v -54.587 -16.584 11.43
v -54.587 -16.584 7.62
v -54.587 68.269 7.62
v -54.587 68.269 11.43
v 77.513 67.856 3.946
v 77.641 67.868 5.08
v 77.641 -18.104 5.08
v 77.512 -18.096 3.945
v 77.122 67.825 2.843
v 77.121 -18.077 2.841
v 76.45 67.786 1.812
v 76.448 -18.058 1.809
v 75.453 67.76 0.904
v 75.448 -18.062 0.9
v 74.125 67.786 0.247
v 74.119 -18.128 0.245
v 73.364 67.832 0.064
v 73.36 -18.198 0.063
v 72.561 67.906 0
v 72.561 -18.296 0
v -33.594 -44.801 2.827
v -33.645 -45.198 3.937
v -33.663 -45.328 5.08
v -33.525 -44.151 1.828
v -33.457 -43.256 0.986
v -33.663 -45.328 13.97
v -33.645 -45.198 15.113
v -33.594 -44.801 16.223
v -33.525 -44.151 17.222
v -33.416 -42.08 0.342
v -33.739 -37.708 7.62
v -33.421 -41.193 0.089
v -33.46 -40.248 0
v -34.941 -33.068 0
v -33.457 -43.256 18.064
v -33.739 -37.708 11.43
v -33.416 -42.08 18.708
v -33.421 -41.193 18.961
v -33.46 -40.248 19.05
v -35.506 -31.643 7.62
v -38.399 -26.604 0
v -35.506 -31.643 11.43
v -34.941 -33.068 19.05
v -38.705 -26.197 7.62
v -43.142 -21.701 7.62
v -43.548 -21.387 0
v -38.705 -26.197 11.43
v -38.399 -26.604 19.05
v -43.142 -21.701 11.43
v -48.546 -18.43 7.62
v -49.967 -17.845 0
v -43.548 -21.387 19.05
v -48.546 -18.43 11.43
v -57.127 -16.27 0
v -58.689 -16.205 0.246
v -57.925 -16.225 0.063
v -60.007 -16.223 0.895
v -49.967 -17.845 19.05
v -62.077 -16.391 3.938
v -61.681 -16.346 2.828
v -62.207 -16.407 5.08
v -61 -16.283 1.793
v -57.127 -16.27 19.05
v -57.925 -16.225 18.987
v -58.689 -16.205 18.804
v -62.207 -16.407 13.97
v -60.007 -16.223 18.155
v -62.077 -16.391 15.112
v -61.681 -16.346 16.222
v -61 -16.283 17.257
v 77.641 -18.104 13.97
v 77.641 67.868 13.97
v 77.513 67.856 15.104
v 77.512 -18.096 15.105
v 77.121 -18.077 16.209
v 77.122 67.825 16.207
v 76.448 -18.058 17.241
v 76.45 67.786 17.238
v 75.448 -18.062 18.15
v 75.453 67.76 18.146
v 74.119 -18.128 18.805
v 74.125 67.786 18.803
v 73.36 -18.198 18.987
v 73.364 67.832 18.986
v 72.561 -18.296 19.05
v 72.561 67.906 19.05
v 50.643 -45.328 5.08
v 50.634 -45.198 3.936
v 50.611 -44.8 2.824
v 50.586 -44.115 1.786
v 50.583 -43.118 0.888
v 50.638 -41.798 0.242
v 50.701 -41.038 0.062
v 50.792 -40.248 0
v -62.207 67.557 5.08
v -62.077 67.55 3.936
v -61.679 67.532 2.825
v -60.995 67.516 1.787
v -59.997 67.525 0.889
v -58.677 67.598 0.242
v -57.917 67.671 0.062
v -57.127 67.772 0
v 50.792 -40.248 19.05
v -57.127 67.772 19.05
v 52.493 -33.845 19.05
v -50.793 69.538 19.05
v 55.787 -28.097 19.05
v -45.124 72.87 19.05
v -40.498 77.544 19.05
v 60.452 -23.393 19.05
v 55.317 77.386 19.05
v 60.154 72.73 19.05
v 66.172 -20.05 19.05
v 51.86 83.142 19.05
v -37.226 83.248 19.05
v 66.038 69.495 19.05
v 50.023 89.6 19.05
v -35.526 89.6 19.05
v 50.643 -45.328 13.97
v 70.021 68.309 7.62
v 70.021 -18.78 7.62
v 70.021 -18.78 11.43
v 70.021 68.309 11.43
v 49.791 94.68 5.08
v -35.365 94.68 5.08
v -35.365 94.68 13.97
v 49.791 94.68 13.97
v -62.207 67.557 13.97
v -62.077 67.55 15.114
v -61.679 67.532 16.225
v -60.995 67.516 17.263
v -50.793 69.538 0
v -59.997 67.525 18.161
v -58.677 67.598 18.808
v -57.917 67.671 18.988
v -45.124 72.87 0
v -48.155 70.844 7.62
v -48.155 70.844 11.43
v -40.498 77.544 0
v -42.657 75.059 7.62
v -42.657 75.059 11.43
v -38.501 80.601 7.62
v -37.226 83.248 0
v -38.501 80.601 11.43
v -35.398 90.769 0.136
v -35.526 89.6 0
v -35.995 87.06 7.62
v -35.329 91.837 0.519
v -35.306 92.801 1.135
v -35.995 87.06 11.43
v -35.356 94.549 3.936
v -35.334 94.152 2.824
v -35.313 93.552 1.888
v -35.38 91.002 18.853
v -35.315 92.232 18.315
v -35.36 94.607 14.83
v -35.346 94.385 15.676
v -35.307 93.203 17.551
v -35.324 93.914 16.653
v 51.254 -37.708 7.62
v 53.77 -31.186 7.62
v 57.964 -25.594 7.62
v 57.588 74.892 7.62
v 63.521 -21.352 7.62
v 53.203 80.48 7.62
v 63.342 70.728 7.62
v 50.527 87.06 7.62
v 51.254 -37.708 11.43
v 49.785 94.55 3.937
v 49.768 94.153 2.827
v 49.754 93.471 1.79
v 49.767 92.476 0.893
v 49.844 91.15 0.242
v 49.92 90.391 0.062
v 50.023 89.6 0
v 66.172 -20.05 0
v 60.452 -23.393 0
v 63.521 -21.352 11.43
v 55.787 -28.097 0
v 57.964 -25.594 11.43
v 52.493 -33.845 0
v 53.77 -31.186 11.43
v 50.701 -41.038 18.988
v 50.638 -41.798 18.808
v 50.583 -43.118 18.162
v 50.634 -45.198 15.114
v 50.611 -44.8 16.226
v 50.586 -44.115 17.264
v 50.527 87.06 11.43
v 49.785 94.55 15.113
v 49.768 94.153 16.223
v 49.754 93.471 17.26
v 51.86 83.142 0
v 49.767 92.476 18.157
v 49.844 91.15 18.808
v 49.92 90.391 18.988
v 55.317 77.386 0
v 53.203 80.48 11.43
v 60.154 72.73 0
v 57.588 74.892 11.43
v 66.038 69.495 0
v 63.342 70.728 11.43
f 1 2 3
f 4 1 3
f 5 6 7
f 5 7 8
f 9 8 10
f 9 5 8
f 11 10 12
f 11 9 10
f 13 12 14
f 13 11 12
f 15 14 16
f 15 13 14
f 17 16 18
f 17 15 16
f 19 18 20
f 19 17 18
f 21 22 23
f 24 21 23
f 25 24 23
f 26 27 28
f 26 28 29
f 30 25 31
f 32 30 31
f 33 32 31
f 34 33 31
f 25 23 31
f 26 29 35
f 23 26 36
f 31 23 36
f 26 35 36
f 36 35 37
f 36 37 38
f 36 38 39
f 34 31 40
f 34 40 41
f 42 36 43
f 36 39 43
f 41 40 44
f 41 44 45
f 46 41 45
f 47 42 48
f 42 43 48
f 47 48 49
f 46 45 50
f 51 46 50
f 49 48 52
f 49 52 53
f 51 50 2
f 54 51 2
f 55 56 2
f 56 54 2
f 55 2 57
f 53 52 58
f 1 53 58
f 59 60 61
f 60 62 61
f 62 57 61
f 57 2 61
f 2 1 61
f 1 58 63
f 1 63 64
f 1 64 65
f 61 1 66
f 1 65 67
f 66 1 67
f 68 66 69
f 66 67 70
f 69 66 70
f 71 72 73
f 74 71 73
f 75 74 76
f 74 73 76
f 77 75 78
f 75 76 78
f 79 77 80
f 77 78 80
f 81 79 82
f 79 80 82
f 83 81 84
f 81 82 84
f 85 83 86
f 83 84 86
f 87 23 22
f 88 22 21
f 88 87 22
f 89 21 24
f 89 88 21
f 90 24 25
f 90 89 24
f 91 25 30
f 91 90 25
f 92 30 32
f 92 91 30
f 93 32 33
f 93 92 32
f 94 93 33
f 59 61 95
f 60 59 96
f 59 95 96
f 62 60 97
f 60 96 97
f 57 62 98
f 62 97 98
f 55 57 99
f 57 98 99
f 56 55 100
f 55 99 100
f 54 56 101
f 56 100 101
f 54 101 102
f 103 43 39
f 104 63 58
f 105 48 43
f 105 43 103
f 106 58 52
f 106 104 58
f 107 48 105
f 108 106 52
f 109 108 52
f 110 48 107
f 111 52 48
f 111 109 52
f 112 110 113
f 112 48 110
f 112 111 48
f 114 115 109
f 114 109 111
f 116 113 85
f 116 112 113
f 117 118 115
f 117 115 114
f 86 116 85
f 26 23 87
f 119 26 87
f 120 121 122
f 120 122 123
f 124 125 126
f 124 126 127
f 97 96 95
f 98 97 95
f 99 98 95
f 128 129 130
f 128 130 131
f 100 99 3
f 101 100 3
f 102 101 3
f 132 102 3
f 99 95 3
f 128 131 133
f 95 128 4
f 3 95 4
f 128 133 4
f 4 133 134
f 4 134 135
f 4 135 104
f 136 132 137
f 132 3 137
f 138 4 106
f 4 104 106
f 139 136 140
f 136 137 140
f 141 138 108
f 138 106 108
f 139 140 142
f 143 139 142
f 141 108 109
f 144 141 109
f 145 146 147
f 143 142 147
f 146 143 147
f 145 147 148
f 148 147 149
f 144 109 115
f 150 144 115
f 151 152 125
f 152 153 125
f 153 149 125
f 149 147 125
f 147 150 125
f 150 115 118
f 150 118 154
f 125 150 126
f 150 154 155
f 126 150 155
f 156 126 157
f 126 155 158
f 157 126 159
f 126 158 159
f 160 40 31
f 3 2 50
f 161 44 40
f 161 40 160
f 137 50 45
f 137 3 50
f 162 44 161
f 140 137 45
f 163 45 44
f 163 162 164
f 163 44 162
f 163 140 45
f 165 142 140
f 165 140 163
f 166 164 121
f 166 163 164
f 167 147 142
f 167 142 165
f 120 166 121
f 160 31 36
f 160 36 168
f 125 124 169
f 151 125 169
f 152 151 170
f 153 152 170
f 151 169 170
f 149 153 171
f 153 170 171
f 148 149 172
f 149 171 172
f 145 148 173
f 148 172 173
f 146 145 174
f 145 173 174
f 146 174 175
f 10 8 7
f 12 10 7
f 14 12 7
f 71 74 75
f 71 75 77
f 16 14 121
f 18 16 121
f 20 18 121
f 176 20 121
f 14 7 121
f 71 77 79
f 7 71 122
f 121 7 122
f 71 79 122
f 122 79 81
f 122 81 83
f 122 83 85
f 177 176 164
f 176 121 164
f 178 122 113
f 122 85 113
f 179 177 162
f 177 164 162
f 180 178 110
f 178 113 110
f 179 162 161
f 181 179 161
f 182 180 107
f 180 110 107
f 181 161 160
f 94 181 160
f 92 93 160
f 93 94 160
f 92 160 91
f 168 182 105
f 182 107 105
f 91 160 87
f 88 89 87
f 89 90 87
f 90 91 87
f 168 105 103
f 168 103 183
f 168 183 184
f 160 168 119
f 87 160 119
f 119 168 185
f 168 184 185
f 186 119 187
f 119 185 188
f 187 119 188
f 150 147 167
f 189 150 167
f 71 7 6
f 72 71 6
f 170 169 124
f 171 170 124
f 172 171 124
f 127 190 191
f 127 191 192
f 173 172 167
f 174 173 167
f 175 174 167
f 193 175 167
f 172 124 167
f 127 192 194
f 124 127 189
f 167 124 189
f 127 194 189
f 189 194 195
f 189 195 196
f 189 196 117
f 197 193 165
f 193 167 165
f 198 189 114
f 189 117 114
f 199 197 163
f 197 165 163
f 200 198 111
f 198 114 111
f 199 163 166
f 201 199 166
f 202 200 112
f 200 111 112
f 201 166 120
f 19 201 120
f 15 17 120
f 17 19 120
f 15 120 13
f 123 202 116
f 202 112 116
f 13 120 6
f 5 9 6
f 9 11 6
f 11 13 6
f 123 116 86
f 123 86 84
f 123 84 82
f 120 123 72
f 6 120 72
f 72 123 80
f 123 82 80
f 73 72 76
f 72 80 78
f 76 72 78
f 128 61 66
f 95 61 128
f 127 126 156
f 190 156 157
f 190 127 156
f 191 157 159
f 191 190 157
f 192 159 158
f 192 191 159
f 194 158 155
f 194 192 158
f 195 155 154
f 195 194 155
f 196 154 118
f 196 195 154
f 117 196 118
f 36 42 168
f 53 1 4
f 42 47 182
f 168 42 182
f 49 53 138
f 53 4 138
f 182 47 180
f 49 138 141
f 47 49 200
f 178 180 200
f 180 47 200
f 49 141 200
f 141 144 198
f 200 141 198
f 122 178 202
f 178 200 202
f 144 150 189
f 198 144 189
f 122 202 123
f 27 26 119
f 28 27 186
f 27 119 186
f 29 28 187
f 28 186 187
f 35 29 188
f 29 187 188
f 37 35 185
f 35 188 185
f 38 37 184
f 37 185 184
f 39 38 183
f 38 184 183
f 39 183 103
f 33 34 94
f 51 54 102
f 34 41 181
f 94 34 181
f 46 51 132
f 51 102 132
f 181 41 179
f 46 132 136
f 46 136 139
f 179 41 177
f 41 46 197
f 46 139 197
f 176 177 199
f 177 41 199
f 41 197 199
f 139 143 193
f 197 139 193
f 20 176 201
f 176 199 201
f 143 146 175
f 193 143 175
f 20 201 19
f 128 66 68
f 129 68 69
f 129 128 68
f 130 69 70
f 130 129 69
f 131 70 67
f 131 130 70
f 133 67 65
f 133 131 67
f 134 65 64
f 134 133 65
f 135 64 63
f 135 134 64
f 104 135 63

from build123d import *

# Parameters (mm, degrees)
F0_W      = 139.8479826748
F0_H      = 140.0080993772
F1_DEPTH  = 19.05
F2_R      = 5.08
F3_R      = 25.5680364158
F4_DEPTH  = 25.4
F5_DEPTH  = 25.4
F6_T      = -7.62
F7_R      = 25.4280545829
F8_DEPTH  = 25.4
F9_DEPTH  = 25.4
F10_R     = 25.4772603169
F11_DEPTH = 25.4
F12_DEPTH = 25.4
F13_R     = 25.5378066053
F14_DEPTH = 25.4
F15_DEPTH = 25.4


with BuildPart() as f1:
    # F0 (on Top) → F1 (new body)
    with BuildSketch(Plane.XY):
        with Locations((7.7169742435, 24.6758498251)):
            Rectangle(F0_W, F0_H)
    extrude(amount=F1_DEPTH)

    # F2
    f2_edges = [f1.edges().sort_by_distance(p)[0] for p in [
        (7.716974, -45.3282, 19.05),
        (7.716974, -45.3282, 0),
        (-62.207017, 94.6799, 9.525),
        (-62.207017, -45.3282, 9.525),
        (-62.207017, 24.67585, 0),
        (-62.207017, 24.67585, 19.05),
        (7.716974, 94.6799, 19.05),
        (7.716974, 94.6799, 0),
        (77.640966, 24.67585, 19.05),
        (77.640966, 24.67585, 0),
        (77.640966, -45.3282, 9.525),
        (77.640966, 94.6799, 9.525),
    ]]
    fillet(f2_edges, radius=F2_R)

    # F3 (on Top) → F4 (join)
    with BuildSketch(Plane.XY):
        with Locations((-58.9822605252, -41.7709499598)):
            Circle(F3_R)
    extrude(amount=F4_DEPTH)

    # F5 (cut): a face of the model
    f5_faces = [f1.faces().sort_by_distance(p)[0] for p in [
        (-58.9822605252, -41.7709499598, 25.4),
    ]]
    extrude(f5_faces, amount=-F5_DEPTH, mode=Mode.SUBTRACT)

    # F6
    f6_openings = [f1.faces().sort_by_distance(p)[0] for p in [
        (-40.784716, -23.810609, 9.525),
    ]]
    offset(amount=F6_T, openings=f6_openings, kind=Kind.INTERSECTION)

    # F7 (on Top) → F8 (join)
    with BuildSketch(Plane.XY):
        with Locations((-60.7334524393, 92.9428115487)):
            Circle(F7_R)
    extrude(amount=F8_DEPTH)

    # F9 (cut): a face of the model
    f9_faces = [f1.faces().sort_by_distance(p)[0] for p in [
        (-60.7334524393, 92.9428115487, 25.4),
    ]]
    extrude(f9_faces, amount=-F9_DEPTH, mode=Mode.SUBTRACT)

    # F10 (on Top) → F11 (join)
    with BuildSketch(Plane.XY):
        with Locations((76.0564357042, -43.5319244862)):
            Circle(F10_R)
    extrude(amount=F11_DEPTH)

    # F12 (cut): a face of the model
    f12_faces = [f1.faces().sort_by_distance(p)[0] for p in [
        (76.0564357042, -43.5319244862, 25.4),
    ]]
    extrude(f12_faces, amount=-F12_DEPTH, mode=Mode.SUBTRACT)

    # F13 (on Top) → F14 (join)
    with BuildSketch(Plane.XY):
        with Locations((75.2917006612, 93.2972580194)):
            Circle(F13_R)
    extrude(amount=F14_DEPTH)

    # F15 (cut): a face of the model
    f15_faces = [f1.faces().sort_by_distance(p)[0] for p in [
        (75.2917006612, 93.2972580194, 25.4),
    ]]
    extrude(f15_faces, amount=-F15_DEPTH, mode=Mode.SUBTRACT)


solid = f1.part
